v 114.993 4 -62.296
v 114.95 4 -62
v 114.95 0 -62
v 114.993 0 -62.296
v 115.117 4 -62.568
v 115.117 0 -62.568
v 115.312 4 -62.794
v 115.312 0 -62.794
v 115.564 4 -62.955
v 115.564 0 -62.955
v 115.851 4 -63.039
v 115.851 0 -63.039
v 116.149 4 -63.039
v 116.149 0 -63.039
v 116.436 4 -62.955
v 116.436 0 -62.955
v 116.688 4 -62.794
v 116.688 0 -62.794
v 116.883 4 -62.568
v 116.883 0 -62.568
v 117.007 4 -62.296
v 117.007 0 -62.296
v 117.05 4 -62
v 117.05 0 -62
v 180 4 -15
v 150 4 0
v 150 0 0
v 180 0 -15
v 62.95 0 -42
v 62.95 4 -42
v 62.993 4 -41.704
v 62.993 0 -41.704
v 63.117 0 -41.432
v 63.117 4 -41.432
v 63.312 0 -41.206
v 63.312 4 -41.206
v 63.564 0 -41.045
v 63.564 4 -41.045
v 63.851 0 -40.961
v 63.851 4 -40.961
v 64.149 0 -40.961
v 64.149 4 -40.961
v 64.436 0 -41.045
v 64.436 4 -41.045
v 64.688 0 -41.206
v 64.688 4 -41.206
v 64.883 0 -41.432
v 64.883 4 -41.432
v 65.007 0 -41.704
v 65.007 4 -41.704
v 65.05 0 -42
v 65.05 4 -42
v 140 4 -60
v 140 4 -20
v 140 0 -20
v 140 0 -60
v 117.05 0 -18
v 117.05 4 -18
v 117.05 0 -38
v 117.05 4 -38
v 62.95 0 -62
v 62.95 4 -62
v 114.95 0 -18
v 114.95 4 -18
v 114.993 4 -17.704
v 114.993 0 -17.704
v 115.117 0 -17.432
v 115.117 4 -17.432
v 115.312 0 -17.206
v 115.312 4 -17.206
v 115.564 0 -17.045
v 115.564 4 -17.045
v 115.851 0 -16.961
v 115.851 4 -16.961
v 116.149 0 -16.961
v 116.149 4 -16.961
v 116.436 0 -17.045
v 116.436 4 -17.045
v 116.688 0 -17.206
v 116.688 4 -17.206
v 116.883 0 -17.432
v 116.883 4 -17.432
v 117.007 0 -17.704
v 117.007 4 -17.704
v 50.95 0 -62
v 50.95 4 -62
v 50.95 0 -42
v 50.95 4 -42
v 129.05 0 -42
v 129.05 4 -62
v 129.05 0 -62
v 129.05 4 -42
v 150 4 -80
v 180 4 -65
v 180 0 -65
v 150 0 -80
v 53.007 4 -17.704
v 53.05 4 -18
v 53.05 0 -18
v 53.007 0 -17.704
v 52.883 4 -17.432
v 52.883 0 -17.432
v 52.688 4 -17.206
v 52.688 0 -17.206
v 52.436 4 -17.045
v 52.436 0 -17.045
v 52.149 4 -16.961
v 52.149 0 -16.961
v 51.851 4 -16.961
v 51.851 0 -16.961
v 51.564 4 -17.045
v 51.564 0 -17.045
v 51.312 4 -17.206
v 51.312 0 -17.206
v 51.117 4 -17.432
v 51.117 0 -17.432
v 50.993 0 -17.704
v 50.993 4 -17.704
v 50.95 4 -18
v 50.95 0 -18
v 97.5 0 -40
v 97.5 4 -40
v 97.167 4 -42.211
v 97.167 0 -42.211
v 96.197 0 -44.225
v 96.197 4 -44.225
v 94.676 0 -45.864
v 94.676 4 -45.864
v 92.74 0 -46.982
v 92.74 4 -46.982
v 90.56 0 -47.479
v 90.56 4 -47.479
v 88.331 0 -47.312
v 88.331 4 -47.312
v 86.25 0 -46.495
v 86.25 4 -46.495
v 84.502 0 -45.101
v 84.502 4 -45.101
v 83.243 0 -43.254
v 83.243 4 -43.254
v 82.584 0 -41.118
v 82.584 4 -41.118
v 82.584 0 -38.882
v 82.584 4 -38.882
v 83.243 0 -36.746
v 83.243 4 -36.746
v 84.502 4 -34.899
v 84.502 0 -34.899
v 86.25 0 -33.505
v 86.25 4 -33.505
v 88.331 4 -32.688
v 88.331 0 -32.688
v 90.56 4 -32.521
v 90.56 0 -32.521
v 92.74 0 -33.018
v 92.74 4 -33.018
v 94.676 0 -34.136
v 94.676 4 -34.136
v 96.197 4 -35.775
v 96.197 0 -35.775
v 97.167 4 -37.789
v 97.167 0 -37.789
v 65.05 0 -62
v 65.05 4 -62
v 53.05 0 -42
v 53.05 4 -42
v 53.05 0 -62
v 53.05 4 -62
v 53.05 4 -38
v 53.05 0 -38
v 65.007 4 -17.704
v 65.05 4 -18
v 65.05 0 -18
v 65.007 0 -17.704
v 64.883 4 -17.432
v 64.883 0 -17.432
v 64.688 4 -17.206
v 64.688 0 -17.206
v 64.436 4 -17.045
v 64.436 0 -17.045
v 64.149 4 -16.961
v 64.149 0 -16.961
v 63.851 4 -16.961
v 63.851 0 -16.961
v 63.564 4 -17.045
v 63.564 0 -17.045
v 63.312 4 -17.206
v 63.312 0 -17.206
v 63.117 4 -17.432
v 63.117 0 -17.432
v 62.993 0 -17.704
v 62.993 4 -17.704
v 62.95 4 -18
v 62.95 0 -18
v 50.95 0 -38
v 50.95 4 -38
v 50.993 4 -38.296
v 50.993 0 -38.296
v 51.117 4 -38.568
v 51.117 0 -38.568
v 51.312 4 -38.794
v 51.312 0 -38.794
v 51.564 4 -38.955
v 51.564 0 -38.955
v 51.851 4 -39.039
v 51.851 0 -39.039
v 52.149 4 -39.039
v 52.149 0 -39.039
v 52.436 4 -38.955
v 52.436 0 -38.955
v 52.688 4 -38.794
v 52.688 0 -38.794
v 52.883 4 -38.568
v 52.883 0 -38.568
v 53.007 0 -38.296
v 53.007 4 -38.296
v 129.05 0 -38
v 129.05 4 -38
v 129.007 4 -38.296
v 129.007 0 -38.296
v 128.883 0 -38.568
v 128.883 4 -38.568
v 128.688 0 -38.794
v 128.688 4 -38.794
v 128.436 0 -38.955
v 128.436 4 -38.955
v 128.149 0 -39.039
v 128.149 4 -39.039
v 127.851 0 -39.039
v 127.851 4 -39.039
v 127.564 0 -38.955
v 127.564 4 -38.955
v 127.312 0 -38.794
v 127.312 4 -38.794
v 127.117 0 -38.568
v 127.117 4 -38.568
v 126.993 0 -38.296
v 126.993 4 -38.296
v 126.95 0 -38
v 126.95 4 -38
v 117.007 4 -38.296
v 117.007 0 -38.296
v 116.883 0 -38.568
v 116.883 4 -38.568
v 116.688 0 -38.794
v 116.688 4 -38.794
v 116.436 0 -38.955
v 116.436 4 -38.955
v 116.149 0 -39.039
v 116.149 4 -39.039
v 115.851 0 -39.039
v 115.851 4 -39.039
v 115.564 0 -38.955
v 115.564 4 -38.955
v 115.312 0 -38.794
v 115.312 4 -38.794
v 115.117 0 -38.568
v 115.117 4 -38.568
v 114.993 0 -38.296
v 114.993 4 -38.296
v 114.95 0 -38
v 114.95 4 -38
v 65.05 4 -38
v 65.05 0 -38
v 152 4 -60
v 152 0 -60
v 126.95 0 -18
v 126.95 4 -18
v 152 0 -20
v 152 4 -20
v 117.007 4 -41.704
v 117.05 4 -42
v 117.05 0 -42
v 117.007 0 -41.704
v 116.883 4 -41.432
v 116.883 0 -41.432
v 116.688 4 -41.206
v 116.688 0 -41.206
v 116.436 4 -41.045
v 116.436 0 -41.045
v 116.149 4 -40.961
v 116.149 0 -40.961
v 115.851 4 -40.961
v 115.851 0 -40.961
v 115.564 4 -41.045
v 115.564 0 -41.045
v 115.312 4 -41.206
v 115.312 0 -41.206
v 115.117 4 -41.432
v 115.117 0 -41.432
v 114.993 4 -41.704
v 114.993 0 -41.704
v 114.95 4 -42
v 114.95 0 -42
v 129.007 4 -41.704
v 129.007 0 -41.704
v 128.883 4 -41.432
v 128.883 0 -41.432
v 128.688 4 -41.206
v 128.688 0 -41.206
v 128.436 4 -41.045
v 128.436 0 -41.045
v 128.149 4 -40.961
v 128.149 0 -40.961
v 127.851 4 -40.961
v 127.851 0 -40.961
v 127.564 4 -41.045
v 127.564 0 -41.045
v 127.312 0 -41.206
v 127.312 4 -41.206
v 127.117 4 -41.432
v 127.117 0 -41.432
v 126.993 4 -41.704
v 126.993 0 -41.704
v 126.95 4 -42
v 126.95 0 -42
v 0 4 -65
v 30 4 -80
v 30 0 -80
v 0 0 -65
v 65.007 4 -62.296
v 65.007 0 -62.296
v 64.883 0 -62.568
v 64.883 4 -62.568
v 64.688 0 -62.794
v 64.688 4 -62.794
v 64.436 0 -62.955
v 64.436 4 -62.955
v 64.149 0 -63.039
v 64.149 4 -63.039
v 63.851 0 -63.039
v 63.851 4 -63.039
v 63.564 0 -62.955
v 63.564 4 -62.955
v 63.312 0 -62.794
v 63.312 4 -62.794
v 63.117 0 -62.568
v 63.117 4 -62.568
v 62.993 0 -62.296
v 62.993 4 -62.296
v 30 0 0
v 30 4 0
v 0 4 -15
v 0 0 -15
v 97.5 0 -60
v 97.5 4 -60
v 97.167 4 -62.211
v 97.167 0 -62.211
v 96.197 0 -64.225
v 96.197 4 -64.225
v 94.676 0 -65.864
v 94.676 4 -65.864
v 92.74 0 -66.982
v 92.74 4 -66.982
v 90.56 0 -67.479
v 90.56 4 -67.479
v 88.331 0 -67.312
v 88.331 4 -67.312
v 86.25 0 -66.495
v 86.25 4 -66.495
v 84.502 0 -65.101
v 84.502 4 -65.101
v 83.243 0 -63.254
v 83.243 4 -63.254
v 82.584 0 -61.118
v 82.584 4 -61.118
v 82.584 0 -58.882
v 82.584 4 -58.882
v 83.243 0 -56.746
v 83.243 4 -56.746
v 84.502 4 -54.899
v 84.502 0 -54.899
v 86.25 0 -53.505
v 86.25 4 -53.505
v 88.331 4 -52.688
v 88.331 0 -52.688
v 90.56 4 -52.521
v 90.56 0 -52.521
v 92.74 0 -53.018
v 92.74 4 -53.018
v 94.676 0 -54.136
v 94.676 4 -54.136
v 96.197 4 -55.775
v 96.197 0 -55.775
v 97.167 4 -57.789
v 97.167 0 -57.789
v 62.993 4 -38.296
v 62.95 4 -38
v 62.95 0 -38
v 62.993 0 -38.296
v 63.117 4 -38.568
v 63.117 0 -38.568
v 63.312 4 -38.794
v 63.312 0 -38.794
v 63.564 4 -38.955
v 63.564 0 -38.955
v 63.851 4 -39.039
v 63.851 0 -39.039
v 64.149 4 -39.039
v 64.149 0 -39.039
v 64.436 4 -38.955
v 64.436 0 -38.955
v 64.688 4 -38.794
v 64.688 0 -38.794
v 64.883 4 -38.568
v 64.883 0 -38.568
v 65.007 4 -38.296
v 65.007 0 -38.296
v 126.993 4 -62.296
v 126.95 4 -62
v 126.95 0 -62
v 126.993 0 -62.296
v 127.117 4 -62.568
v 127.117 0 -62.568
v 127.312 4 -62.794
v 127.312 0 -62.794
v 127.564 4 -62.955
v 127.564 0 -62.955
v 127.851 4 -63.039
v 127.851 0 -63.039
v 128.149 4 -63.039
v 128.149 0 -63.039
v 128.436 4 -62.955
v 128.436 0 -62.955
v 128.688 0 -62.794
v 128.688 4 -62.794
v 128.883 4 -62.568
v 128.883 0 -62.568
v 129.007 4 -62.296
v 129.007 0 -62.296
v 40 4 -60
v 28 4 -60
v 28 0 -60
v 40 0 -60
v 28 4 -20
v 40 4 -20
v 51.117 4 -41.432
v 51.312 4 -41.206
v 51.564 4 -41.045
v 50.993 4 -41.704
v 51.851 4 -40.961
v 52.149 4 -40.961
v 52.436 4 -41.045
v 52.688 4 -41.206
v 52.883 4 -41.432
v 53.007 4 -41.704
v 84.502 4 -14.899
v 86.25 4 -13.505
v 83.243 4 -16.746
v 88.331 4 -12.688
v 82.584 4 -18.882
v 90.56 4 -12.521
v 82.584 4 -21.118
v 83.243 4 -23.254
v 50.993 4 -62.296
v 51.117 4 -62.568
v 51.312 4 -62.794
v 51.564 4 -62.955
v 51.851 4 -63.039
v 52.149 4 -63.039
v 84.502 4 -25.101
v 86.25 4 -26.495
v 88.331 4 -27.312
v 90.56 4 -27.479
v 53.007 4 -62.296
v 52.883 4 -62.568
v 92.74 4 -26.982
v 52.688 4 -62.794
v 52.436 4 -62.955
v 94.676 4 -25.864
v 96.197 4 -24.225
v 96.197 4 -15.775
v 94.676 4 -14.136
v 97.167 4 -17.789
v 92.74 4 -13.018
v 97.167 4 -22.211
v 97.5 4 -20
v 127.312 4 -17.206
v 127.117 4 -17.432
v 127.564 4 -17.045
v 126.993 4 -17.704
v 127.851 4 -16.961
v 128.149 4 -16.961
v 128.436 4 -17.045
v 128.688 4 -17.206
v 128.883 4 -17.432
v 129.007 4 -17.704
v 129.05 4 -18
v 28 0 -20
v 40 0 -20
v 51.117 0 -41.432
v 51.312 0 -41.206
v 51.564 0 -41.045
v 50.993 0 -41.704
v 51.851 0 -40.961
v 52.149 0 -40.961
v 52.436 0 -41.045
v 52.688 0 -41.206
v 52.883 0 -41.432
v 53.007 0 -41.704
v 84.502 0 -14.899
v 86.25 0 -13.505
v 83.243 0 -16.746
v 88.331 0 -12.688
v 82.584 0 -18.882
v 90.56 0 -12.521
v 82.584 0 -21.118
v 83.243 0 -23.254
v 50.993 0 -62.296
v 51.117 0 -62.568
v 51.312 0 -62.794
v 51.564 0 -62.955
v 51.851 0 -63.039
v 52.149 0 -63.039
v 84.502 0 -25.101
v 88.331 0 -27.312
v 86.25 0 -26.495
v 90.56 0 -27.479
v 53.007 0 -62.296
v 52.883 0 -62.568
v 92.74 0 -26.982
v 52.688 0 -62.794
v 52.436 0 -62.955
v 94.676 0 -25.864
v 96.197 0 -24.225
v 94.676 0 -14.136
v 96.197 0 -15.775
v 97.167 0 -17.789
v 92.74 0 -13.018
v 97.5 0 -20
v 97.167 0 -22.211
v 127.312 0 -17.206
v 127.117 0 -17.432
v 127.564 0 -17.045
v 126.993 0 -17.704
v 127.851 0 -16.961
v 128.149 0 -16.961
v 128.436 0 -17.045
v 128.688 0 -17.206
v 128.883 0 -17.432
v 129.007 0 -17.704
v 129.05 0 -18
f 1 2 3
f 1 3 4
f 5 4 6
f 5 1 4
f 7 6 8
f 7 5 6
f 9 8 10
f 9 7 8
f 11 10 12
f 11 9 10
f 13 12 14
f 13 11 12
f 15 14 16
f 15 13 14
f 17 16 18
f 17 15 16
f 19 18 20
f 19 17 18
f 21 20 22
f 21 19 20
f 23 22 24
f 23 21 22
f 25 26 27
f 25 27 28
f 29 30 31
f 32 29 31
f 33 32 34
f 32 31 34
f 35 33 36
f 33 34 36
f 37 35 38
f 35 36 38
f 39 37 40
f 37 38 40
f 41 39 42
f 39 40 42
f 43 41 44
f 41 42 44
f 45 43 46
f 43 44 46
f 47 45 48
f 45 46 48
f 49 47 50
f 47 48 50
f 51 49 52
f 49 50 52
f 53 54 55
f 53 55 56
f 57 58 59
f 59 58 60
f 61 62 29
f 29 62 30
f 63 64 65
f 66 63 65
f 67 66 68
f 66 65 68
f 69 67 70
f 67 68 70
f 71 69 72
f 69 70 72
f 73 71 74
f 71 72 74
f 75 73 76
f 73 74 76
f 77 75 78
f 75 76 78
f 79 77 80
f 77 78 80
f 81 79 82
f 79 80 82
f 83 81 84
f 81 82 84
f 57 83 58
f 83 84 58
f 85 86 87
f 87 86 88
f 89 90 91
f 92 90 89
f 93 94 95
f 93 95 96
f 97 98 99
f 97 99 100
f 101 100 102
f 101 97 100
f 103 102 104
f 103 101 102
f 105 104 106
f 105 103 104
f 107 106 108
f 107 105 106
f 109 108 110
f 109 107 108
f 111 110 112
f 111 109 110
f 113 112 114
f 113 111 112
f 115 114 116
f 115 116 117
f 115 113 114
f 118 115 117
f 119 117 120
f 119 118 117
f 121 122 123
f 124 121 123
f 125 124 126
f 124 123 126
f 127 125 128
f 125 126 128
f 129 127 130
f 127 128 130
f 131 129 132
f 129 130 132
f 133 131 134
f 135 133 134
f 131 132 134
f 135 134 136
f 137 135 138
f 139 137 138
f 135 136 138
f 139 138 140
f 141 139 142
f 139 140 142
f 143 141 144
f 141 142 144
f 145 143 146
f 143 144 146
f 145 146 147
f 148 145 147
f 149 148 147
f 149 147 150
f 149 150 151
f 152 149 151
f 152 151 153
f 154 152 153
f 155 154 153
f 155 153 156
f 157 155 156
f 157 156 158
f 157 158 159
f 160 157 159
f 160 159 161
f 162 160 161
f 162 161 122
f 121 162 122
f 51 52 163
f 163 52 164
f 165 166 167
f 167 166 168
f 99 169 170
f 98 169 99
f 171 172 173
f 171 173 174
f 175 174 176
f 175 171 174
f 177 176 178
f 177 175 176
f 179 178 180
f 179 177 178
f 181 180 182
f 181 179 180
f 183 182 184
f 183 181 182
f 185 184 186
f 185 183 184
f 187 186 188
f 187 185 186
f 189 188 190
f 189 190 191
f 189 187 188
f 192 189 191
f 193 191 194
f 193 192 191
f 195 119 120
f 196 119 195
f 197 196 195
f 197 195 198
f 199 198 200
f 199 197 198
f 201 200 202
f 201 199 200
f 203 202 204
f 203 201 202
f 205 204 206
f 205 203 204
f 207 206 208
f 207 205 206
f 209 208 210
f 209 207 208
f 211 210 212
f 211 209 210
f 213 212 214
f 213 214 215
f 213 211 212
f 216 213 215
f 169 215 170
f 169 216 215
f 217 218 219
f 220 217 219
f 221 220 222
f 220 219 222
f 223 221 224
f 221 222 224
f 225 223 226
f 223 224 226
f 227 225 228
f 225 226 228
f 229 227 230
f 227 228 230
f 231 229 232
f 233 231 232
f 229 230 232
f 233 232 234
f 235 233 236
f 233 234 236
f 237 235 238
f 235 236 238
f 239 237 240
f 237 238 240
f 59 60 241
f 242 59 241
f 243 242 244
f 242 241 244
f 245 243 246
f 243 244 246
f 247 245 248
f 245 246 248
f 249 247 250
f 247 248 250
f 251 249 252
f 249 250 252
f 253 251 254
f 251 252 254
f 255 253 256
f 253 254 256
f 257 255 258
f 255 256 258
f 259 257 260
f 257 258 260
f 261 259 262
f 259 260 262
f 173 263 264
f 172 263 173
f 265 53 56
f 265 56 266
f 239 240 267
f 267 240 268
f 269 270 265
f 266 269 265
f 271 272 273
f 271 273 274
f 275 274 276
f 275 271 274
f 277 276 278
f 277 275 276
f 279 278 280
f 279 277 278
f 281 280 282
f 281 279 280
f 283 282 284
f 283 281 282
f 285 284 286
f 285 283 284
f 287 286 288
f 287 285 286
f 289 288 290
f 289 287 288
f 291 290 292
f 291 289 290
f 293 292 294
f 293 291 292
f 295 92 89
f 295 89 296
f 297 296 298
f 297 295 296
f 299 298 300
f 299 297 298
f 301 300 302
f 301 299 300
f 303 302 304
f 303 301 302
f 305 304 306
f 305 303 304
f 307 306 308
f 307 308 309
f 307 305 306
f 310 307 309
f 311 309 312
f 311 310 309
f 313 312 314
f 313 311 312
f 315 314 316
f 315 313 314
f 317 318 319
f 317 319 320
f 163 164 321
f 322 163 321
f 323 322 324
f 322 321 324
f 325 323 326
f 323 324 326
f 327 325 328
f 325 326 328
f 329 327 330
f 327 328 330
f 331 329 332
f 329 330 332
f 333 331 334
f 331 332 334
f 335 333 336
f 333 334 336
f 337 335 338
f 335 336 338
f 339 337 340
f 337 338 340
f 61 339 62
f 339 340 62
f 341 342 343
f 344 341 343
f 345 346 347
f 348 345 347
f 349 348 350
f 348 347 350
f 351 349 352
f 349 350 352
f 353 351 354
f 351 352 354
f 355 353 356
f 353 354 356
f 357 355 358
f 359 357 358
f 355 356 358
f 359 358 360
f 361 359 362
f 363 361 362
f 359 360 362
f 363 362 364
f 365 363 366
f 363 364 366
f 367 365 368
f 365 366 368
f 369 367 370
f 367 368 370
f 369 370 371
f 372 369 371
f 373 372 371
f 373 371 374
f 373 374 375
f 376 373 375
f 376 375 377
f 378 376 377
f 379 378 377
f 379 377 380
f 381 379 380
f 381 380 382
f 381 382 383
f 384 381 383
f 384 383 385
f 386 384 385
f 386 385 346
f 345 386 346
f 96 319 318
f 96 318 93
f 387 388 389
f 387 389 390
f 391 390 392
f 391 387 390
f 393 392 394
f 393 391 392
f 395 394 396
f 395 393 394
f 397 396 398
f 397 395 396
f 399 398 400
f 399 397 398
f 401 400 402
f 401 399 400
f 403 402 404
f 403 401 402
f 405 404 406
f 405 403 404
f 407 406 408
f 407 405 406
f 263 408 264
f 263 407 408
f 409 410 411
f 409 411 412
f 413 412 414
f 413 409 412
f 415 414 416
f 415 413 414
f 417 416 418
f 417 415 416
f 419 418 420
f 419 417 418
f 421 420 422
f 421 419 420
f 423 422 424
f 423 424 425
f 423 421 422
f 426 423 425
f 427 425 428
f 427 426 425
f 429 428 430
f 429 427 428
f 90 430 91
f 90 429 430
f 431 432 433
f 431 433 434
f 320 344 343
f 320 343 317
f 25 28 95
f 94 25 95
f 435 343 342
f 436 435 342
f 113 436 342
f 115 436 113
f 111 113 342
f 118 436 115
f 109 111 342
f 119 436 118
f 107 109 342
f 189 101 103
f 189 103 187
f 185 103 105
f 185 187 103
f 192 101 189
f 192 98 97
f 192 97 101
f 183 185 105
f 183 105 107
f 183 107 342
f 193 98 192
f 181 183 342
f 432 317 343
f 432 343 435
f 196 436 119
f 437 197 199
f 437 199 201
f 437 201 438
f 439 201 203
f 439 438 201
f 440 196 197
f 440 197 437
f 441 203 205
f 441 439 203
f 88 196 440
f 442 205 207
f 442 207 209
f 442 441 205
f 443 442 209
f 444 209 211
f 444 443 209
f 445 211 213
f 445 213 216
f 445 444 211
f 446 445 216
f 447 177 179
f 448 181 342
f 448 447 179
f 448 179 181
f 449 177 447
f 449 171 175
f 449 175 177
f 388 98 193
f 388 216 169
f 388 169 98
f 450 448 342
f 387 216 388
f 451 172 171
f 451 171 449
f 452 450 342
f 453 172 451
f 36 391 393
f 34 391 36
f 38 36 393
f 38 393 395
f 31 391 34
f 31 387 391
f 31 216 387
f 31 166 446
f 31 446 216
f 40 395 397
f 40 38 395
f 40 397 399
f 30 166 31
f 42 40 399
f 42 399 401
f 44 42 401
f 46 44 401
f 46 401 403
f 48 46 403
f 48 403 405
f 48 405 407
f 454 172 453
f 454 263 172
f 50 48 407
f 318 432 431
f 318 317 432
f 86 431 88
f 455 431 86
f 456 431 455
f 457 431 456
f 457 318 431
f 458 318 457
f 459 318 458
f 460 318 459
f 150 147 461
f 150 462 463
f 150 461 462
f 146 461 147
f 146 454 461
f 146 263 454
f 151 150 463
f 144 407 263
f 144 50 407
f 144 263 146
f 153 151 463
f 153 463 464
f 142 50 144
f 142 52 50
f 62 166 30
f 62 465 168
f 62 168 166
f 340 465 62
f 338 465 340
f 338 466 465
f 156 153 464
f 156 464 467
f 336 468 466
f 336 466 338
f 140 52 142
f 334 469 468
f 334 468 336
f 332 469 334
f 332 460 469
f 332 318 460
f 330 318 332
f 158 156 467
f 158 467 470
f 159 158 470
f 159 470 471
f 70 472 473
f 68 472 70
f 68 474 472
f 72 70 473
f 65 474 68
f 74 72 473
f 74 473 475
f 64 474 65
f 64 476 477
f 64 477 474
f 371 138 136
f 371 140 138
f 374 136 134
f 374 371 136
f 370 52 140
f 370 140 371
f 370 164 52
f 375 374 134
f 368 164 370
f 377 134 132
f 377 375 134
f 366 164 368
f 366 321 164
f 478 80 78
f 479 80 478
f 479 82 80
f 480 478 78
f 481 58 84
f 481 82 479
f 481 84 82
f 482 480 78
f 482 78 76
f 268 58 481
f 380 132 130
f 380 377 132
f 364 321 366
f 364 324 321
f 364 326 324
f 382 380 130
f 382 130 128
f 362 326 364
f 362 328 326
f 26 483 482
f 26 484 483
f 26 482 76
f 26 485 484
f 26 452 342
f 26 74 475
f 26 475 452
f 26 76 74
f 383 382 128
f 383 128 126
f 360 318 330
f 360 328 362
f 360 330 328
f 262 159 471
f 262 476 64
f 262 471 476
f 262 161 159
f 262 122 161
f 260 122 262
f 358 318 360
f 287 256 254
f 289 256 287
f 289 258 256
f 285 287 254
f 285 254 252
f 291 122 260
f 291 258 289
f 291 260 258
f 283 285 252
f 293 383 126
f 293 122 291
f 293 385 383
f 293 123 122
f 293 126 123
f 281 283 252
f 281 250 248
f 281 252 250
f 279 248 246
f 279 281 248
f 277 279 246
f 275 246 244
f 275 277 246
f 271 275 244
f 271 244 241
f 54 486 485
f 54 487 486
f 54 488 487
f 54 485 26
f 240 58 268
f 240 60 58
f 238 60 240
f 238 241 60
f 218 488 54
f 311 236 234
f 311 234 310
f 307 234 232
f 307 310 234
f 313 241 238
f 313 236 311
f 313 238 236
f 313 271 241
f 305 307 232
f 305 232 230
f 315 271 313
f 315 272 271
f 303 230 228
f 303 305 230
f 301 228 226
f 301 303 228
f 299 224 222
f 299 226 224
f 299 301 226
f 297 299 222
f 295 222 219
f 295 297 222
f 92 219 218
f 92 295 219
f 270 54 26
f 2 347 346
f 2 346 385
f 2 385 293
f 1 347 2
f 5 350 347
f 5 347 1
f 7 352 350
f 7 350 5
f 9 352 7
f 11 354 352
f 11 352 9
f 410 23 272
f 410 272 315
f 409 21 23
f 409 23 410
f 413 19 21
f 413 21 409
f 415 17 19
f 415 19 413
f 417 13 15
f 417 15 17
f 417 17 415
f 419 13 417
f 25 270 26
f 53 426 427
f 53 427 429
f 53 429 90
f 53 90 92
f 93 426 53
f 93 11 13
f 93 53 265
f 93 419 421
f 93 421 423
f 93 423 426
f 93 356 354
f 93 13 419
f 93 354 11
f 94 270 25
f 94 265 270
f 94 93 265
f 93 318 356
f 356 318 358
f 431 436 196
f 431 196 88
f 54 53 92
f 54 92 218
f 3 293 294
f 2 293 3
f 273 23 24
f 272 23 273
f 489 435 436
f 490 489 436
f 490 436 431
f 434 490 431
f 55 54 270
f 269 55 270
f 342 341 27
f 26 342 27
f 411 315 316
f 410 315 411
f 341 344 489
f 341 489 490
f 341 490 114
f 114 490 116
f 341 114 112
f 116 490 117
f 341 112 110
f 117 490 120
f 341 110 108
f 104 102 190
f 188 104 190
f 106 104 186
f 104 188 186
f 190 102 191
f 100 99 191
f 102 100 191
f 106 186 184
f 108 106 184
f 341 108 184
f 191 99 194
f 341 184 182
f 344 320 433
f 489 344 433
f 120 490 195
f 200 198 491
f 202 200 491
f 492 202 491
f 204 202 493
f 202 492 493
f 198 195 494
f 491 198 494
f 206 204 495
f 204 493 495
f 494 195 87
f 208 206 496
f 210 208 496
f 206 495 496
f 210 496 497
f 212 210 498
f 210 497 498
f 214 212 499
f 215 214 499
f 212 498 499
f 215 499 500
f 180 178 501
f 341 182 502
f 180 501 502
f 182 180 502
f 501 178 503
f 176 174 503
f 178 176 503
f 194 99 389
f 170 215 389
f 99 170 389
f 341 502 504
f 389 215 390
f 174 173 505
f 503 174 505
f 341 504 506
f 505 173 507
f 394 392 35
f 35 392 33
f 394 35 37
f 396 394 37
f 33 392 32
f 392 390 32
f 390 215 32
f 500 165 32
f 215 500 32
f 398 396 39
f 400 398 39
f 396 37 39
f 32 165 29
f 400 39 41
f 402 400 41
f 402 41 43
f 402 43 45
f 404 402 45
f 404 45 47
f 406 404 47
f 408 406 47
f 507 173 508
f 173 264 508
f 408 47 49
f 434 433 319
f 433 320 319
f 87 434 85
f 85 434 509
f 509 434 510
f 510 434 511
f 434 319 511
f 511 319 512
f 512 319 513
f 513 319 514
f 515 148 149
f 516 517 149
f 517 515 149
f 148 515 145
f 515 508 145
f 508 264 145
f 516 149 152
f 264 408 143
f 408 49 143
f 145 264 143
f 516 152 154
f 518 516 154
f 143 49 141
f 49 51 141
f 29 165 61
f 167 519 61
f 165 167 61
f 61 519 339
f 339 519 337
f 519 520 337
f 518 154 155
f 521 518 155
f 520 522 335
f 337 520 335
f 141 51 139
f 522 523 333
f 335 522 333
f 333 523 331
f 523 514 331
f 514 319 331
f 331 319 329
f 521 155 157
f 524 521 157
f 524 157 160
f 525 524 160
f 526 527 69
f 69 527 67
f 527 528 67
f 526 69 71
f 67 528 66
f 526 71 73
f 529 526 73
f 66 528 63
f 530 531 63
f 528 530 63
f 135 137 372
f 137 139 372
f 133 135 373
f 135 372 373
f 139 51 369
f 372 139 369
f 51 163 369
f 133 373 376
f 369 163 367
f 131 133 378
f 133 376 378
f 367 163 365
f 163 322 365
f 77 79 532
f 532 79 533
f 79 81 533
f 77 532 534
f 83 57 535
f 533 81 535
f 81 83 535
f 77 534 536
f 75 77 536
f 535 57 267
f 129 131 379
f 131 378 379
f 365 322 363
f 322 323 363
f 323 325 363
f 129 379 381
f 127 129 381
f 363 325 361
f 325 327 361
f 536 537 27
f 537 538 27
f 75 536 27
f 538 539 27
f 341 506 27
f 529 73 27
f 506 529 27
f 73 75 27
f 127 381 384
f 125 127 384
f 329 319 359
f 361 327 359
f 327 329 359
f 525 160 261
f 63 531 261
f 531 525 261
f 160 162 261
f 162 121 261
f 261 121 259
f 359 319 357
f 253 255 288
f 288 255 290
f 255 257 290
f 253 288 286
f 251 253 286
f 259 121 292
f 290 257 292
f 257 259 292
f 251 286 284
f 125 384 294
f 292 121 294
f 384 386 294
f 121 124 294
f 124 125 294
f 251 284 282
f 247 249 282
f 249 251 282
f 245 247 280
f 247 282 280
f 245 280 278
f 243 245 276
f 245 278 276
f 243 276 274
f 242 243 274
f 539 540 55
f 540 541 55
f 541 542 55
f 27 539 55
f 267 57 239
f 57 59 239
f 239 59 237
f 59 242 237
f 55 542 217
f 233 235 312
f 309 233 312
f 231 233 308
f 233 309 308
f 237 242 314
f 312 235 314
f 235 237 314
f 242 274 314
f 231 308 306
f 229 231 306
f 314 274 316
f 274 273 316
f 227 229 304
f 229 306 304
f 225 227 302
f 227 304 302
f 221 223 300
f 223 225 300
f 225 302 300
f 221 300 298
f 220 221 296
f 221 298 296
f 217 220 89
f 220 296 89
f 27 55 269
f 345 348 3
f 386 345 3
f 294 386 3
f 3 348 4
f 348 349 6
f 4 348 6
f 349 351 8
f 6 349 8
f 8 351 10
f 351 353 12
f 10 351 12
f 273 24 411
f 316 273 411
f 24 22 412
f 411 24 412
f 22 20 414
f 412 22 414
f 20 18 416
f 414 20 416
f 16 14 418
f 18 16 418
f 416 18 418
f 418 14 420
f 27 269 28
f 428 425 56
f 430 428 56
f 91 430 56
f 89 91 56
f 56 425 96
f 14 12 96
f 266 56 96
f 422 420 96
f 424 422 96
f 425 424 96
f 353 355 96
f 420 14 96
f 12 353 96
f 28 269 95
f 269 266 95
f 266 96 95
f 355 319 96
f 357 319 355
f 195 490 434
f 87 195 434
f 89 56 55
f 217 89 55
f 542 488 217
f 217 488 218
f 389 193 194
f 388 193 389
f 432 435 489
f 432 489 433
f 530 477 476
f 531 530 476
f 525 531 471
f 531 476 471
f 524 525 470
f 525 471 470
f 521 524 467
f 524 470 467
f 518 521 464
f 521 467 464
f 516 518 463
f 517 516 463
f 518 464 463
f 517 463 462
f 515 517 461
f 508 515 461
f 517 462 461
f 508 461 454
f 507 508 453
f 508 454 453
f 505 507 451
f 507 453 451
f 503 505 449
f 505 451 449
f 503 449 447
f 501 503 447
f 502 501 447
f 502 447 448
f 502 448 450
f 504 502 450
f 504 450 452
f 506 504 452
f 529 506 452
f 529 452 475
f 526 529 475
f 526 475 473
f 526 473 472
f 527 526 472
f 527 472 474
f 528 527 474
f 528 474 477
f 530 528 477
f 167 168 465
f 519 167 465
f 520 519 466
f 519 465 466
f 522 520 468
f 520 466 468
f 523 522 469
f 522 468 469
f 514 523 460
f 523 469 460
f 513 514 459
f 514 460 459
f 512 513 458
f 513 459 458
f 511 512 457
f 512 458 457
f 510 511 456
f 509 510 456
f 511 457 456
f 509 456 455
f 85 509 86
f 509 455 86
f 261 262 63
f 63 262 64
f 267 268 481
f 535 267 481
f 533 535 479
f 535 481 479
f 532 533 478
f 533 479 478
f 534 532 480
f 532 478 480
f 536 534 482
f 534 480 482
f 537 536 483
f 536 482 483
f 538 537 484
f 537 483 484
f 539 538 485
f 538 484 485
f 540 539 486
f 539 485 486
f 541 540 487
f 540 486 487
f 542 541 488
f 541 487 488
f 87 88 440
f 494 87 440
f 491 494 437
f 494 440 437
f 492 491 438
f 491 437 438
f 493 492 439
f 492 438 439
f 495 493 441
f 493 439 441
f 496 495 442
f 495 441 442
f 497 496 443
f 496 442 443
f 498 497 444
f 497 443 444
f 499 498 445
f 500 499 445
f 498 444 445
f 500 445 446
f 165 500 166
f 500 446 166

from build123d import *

# Parameters (mm, degrees)
ESQUISSE1_W                         = 180
ESQUISSE1_H                         = 80
BOSS_EXTRU_1_DEPTH                  = 4
ENL_V_MAT_EXTRU_1_DEPTH             = 4
ENL_V_MAT_EXTRU_2_DEPTH             = 4
ENL_V_MAT_EXTRU_5_REACH             = 6
ESQUISSE11_W                        = 12
ESQUISSE11_H                        = 40
ENL_V_MAT_EXTRU_5_DIRECTION_2_DEPTH = 1
ENL_V_MAT_EXTRU_6_REACH             = 6
ESQUISSE14_R                        = 7.5


with BuildPart() as part:
    # Esquisse1 → Boss.-Extru.1 (new body)
    with BuildSketch(Plane(origin=(0, 0, 0), x_dir=(1, 0, 0), z_dir=(0, 1, 0))):
        with Locations((90, 40)):
            Rectangle(ESQUISSE1_W, ESQUISSE1_H)
    extrude(amount=BOSS_EXTRU_1_DEPTH)

    # Esquisse2 → Enlèv. mat.-Extru.1 (cut)
    with BuildSketch(Plane(origin=(0, 4, 0), x_dir=(1, 0, 0), z_dir=(0, 1, 0))):
        Polygon((30, 0), (0, 15), (0, 0), align=None)
        Polygon((30, 80), (0, 65), (0, 80), align=None)
        Polygon((150, 0), (180, 15), (180, 0), align=None)
        Polygon((150, 80), (180, 80), (180, 65), align=None)
    extrude(amount=-ENL_V_MAT_EXTRU_1_DEPTH, mode=Mode.SUBTRACT)

    # Esquisse3 → Enlèv. mat.-Extru.2 (cut)
    with BuildSketch(Plane(origin=(0, 4, 0), x_dir=(1, 0, 0), z_dir=(0, 1, 0))):
        with BuildLine():
            Line((65.05, 38), (65.05, 18))
            ThreePointArc((65.05, 18), (64, 16.95), (62.95, 18))
            Line((62.95, 18), (62.95, 38))
            ThreePointArc((62.95, 38), (64, 39.05), (65.05, 38))
        make_face()
        with BuildLine():
            Line((50.95, 18), (50.95, 38))
            ThreePointArc((50.95, 38), (52, 39.05), (53.05, 38))
            Line((53.05, 38), (53.05, 18))
            ThreePointArc((53.05, 18), (52, 16.95), (50.95, 18))
        make_face()
        with BuildLine():
            Line((129.05, 18), (129.05, 38))
            ThreePointArc((129.05, 38), (128, 39.05), (126.95, 38))
            Line((126.95, 38), (126.95, 18))
            ThreePointArc((126.95, 18), (128, 16.95), (129.05, 18))
        make_face()
        with BuildLine():
            Line((114.95, 38), (114.95, 18))
            ThreePointArc((114.95, 18), (116, 16.95), (117.05, 18))
            Line((117.05, 18), (117.05, 38))
            ThreePointArc((117.05, 38), (116, 39.05), (114.95, 38))
        make_face()
        with BuildLine():
            Line((50.95, 62), (50.95, 42))
            ThreePointArc((50.95, 42), (52, 40.95), (53.05, 42))
            Line((53.05, 42), (53.05, 62))
            ThreePointArc((53.05, 62), (52, 63.05), (50.95, 62))
        make_face()
        with BuildLine():
            Line((65.05, 42), (65.05, 62))
            ThreePointArc((65.05, 62), (64, 63.05), (62.95, 62))
            Line((62.95, 62), (62.95, 42))
            ThreePointArc((62.95, 42), (64, 40.95), (65.05, 42))
        make_face()
        with BuildLine():
            Line((114.95, 42), (114.95, 62))
            ThreePointArc((114.95, 62), (116, 63.05), (117.05, 62))
            Line((117.05, 62), (117.05, 42))
            ThreePointArc((117.05, 42), (116, 40.95), (114.95, 42))
        make_face()
        with BuildLine():
            Line((129.05, 62), (129.05, 42))
            ThreePointArc((129.05, 42), (128, 40.95), (126.95, 42))
            Line((126.95, 42), (126.95, 62))
            ThreePointArc((126.95, 62), (128, 63.05), (129.05, 62))
        make_face()
    extrude(amount=-ENL_V_MAT_EXTRU_2_DEPTH, mode=Mode.SUBTRACT)

    # Esquisse11 → Enlèv. mat.-Extru.5 (cut, up to next)
    with BuildSketch(Plane(origin=(0, 4, 0), x_dir=(1, 0, 0), z_dir=(0, 1, 0)), mode=Mode.PRIVATE) as enl_v_mat_extru_5_sk1:
        with Locations((34, 40)):
            Rectangle(ESQUISSE11_W, ESQUISSE11_H)
    enl_v_mat_extru_5_tool1 = extrude(enl_v_mat_extru_5_sk1.sketch, amount=-ENL_V_MAT_EXTRU_5_REACH, mode=Mode.PRIVATE) & part.part
    add(enl_v_mat_extru_5_tool1.solids().sort_by_distance((34, 4, -40))[0], mode=Mode.SUBTRACT)
    # Esquisse11 → Enlèv. mat.-Extru.5 (cut, up to next)
    with BuildSketch(Plane(origin=(0, 4, 0), x_dir=(1, 0, 0), z_dir=(0, 1, 0)), mode=Mode.PRIVATE) as enl_v_mat_extru_5_sk2:
        with Locations((146, 40)):
            Rectangle(ESQUISSE11_W, ESQUISSE11_H)
    enl_v_mat_extru_5_tool2 = extrude(enl_v_mat_extru_5_sk2.sketch, amount=-ENL_V_MAT_EXTRU_5_REACH, mode=Mode.PRIVATE) & part.part
    add(enl_v_mat_extru_5_tool2.solids().sort_by_distance((146, 4, -40))[0], mode=Mode.SUBTRACT)

    # Esquisse11 → Enlèv. mat.-Extru.5 direction 2 (cut)
    with BuildSketch(Plane(origin=(0, 4, 0), x_dir=(1, 0, 0), z_dir=(0, 1, 0))):
        with Locations((34, 40)):
            Rectangle(ESQUISSE11_W, ESQUISSE11_H)
        with Locations((146, 40)):
            Rectangle(ESQUISSE11_W, ESQUISSE11_H)
    extrude(amount=ENL_V_MAT_EXTRU_5_DIRECTION_2_DEPTH, mode=Mode.SUBTRACT)

    # Esquisse14 → Enlèv. mat.-Extru.6 (cut, up to next)
    with BuildSketch(Plane(origin=(0, 4, 0), x_dir=(1, 0, 0), z_dir=(0, 1, 0)), mode=Mode.PRIVATE) as enl_v_mat_extru_6_sk1:
        with Locations((90, 60)):
            Circle(ESQUISSE14_R)
    enl_v_mat_extru_6_tool1 = extrude(enl_v_mat_extru_6_sk1.sketch, amount=-ENL_V_MAT_EXTRU_6_REACH, mode=Mode.PRIVATE) & part.part
    add(enl_v_mat_extru_6_tool1.solids().sort_by_distance((90, 4, -60))[0], mode=Mode.SUBTRACT)
    # Esquisse14 → Enlèv. mat.-Extru.6 (cut, up to next)
    with BuildSketch(Plane(origin=(0, 4, 0), x_dir=(1, 0, 0), z_dir=(0, 1, 0)), mode=Mode.PRIVATE) as enl_v_mat_extru_6_sk2:
        with Locations((90, 40)):
            Circle(ESQUISSE14_R)
    enl_v_mat_extru_6_tool2 = extrude(enl_v_mat_extru_6_sk2.sketch, amount=-ENL_V_MAT_EXTRU_6_REACH, mode=Mode.PRIVATE) & part.part
    add(enl_v_mat_extru_6_tool2.solids().sort_by_distance((90, 4, -40))[0], mode=Mode.SUBTRACT)
    # Esquisse14 → Enlèv. mat.-Extru.6 (cut, up to next)
    with BuildSketch(Plane(origin=(0, 4, 0), x_dir=(1, 0, 0), z_dir=(0, 1, 0)), mode=Mode.PRIVATE) as enl_v_mat_extru_6_sk3:
        with Locations((90, 20)):
            Circle(ESQUISSE14_R)
    enl_v_mat_extru_6_tool3 = extrude(enl_v_mat_extru_6_sk3.sketch, amount=-ENL_V_MAT_EXTRU_6_REACH, mode=Mode.PRIVATE) & part.part
    add(enl_v_mat_extru_6_tool3.solids().sort_by_distance((90, 4, -20))[0], mode=Mode.SUBTRACT)


solid = part.part
